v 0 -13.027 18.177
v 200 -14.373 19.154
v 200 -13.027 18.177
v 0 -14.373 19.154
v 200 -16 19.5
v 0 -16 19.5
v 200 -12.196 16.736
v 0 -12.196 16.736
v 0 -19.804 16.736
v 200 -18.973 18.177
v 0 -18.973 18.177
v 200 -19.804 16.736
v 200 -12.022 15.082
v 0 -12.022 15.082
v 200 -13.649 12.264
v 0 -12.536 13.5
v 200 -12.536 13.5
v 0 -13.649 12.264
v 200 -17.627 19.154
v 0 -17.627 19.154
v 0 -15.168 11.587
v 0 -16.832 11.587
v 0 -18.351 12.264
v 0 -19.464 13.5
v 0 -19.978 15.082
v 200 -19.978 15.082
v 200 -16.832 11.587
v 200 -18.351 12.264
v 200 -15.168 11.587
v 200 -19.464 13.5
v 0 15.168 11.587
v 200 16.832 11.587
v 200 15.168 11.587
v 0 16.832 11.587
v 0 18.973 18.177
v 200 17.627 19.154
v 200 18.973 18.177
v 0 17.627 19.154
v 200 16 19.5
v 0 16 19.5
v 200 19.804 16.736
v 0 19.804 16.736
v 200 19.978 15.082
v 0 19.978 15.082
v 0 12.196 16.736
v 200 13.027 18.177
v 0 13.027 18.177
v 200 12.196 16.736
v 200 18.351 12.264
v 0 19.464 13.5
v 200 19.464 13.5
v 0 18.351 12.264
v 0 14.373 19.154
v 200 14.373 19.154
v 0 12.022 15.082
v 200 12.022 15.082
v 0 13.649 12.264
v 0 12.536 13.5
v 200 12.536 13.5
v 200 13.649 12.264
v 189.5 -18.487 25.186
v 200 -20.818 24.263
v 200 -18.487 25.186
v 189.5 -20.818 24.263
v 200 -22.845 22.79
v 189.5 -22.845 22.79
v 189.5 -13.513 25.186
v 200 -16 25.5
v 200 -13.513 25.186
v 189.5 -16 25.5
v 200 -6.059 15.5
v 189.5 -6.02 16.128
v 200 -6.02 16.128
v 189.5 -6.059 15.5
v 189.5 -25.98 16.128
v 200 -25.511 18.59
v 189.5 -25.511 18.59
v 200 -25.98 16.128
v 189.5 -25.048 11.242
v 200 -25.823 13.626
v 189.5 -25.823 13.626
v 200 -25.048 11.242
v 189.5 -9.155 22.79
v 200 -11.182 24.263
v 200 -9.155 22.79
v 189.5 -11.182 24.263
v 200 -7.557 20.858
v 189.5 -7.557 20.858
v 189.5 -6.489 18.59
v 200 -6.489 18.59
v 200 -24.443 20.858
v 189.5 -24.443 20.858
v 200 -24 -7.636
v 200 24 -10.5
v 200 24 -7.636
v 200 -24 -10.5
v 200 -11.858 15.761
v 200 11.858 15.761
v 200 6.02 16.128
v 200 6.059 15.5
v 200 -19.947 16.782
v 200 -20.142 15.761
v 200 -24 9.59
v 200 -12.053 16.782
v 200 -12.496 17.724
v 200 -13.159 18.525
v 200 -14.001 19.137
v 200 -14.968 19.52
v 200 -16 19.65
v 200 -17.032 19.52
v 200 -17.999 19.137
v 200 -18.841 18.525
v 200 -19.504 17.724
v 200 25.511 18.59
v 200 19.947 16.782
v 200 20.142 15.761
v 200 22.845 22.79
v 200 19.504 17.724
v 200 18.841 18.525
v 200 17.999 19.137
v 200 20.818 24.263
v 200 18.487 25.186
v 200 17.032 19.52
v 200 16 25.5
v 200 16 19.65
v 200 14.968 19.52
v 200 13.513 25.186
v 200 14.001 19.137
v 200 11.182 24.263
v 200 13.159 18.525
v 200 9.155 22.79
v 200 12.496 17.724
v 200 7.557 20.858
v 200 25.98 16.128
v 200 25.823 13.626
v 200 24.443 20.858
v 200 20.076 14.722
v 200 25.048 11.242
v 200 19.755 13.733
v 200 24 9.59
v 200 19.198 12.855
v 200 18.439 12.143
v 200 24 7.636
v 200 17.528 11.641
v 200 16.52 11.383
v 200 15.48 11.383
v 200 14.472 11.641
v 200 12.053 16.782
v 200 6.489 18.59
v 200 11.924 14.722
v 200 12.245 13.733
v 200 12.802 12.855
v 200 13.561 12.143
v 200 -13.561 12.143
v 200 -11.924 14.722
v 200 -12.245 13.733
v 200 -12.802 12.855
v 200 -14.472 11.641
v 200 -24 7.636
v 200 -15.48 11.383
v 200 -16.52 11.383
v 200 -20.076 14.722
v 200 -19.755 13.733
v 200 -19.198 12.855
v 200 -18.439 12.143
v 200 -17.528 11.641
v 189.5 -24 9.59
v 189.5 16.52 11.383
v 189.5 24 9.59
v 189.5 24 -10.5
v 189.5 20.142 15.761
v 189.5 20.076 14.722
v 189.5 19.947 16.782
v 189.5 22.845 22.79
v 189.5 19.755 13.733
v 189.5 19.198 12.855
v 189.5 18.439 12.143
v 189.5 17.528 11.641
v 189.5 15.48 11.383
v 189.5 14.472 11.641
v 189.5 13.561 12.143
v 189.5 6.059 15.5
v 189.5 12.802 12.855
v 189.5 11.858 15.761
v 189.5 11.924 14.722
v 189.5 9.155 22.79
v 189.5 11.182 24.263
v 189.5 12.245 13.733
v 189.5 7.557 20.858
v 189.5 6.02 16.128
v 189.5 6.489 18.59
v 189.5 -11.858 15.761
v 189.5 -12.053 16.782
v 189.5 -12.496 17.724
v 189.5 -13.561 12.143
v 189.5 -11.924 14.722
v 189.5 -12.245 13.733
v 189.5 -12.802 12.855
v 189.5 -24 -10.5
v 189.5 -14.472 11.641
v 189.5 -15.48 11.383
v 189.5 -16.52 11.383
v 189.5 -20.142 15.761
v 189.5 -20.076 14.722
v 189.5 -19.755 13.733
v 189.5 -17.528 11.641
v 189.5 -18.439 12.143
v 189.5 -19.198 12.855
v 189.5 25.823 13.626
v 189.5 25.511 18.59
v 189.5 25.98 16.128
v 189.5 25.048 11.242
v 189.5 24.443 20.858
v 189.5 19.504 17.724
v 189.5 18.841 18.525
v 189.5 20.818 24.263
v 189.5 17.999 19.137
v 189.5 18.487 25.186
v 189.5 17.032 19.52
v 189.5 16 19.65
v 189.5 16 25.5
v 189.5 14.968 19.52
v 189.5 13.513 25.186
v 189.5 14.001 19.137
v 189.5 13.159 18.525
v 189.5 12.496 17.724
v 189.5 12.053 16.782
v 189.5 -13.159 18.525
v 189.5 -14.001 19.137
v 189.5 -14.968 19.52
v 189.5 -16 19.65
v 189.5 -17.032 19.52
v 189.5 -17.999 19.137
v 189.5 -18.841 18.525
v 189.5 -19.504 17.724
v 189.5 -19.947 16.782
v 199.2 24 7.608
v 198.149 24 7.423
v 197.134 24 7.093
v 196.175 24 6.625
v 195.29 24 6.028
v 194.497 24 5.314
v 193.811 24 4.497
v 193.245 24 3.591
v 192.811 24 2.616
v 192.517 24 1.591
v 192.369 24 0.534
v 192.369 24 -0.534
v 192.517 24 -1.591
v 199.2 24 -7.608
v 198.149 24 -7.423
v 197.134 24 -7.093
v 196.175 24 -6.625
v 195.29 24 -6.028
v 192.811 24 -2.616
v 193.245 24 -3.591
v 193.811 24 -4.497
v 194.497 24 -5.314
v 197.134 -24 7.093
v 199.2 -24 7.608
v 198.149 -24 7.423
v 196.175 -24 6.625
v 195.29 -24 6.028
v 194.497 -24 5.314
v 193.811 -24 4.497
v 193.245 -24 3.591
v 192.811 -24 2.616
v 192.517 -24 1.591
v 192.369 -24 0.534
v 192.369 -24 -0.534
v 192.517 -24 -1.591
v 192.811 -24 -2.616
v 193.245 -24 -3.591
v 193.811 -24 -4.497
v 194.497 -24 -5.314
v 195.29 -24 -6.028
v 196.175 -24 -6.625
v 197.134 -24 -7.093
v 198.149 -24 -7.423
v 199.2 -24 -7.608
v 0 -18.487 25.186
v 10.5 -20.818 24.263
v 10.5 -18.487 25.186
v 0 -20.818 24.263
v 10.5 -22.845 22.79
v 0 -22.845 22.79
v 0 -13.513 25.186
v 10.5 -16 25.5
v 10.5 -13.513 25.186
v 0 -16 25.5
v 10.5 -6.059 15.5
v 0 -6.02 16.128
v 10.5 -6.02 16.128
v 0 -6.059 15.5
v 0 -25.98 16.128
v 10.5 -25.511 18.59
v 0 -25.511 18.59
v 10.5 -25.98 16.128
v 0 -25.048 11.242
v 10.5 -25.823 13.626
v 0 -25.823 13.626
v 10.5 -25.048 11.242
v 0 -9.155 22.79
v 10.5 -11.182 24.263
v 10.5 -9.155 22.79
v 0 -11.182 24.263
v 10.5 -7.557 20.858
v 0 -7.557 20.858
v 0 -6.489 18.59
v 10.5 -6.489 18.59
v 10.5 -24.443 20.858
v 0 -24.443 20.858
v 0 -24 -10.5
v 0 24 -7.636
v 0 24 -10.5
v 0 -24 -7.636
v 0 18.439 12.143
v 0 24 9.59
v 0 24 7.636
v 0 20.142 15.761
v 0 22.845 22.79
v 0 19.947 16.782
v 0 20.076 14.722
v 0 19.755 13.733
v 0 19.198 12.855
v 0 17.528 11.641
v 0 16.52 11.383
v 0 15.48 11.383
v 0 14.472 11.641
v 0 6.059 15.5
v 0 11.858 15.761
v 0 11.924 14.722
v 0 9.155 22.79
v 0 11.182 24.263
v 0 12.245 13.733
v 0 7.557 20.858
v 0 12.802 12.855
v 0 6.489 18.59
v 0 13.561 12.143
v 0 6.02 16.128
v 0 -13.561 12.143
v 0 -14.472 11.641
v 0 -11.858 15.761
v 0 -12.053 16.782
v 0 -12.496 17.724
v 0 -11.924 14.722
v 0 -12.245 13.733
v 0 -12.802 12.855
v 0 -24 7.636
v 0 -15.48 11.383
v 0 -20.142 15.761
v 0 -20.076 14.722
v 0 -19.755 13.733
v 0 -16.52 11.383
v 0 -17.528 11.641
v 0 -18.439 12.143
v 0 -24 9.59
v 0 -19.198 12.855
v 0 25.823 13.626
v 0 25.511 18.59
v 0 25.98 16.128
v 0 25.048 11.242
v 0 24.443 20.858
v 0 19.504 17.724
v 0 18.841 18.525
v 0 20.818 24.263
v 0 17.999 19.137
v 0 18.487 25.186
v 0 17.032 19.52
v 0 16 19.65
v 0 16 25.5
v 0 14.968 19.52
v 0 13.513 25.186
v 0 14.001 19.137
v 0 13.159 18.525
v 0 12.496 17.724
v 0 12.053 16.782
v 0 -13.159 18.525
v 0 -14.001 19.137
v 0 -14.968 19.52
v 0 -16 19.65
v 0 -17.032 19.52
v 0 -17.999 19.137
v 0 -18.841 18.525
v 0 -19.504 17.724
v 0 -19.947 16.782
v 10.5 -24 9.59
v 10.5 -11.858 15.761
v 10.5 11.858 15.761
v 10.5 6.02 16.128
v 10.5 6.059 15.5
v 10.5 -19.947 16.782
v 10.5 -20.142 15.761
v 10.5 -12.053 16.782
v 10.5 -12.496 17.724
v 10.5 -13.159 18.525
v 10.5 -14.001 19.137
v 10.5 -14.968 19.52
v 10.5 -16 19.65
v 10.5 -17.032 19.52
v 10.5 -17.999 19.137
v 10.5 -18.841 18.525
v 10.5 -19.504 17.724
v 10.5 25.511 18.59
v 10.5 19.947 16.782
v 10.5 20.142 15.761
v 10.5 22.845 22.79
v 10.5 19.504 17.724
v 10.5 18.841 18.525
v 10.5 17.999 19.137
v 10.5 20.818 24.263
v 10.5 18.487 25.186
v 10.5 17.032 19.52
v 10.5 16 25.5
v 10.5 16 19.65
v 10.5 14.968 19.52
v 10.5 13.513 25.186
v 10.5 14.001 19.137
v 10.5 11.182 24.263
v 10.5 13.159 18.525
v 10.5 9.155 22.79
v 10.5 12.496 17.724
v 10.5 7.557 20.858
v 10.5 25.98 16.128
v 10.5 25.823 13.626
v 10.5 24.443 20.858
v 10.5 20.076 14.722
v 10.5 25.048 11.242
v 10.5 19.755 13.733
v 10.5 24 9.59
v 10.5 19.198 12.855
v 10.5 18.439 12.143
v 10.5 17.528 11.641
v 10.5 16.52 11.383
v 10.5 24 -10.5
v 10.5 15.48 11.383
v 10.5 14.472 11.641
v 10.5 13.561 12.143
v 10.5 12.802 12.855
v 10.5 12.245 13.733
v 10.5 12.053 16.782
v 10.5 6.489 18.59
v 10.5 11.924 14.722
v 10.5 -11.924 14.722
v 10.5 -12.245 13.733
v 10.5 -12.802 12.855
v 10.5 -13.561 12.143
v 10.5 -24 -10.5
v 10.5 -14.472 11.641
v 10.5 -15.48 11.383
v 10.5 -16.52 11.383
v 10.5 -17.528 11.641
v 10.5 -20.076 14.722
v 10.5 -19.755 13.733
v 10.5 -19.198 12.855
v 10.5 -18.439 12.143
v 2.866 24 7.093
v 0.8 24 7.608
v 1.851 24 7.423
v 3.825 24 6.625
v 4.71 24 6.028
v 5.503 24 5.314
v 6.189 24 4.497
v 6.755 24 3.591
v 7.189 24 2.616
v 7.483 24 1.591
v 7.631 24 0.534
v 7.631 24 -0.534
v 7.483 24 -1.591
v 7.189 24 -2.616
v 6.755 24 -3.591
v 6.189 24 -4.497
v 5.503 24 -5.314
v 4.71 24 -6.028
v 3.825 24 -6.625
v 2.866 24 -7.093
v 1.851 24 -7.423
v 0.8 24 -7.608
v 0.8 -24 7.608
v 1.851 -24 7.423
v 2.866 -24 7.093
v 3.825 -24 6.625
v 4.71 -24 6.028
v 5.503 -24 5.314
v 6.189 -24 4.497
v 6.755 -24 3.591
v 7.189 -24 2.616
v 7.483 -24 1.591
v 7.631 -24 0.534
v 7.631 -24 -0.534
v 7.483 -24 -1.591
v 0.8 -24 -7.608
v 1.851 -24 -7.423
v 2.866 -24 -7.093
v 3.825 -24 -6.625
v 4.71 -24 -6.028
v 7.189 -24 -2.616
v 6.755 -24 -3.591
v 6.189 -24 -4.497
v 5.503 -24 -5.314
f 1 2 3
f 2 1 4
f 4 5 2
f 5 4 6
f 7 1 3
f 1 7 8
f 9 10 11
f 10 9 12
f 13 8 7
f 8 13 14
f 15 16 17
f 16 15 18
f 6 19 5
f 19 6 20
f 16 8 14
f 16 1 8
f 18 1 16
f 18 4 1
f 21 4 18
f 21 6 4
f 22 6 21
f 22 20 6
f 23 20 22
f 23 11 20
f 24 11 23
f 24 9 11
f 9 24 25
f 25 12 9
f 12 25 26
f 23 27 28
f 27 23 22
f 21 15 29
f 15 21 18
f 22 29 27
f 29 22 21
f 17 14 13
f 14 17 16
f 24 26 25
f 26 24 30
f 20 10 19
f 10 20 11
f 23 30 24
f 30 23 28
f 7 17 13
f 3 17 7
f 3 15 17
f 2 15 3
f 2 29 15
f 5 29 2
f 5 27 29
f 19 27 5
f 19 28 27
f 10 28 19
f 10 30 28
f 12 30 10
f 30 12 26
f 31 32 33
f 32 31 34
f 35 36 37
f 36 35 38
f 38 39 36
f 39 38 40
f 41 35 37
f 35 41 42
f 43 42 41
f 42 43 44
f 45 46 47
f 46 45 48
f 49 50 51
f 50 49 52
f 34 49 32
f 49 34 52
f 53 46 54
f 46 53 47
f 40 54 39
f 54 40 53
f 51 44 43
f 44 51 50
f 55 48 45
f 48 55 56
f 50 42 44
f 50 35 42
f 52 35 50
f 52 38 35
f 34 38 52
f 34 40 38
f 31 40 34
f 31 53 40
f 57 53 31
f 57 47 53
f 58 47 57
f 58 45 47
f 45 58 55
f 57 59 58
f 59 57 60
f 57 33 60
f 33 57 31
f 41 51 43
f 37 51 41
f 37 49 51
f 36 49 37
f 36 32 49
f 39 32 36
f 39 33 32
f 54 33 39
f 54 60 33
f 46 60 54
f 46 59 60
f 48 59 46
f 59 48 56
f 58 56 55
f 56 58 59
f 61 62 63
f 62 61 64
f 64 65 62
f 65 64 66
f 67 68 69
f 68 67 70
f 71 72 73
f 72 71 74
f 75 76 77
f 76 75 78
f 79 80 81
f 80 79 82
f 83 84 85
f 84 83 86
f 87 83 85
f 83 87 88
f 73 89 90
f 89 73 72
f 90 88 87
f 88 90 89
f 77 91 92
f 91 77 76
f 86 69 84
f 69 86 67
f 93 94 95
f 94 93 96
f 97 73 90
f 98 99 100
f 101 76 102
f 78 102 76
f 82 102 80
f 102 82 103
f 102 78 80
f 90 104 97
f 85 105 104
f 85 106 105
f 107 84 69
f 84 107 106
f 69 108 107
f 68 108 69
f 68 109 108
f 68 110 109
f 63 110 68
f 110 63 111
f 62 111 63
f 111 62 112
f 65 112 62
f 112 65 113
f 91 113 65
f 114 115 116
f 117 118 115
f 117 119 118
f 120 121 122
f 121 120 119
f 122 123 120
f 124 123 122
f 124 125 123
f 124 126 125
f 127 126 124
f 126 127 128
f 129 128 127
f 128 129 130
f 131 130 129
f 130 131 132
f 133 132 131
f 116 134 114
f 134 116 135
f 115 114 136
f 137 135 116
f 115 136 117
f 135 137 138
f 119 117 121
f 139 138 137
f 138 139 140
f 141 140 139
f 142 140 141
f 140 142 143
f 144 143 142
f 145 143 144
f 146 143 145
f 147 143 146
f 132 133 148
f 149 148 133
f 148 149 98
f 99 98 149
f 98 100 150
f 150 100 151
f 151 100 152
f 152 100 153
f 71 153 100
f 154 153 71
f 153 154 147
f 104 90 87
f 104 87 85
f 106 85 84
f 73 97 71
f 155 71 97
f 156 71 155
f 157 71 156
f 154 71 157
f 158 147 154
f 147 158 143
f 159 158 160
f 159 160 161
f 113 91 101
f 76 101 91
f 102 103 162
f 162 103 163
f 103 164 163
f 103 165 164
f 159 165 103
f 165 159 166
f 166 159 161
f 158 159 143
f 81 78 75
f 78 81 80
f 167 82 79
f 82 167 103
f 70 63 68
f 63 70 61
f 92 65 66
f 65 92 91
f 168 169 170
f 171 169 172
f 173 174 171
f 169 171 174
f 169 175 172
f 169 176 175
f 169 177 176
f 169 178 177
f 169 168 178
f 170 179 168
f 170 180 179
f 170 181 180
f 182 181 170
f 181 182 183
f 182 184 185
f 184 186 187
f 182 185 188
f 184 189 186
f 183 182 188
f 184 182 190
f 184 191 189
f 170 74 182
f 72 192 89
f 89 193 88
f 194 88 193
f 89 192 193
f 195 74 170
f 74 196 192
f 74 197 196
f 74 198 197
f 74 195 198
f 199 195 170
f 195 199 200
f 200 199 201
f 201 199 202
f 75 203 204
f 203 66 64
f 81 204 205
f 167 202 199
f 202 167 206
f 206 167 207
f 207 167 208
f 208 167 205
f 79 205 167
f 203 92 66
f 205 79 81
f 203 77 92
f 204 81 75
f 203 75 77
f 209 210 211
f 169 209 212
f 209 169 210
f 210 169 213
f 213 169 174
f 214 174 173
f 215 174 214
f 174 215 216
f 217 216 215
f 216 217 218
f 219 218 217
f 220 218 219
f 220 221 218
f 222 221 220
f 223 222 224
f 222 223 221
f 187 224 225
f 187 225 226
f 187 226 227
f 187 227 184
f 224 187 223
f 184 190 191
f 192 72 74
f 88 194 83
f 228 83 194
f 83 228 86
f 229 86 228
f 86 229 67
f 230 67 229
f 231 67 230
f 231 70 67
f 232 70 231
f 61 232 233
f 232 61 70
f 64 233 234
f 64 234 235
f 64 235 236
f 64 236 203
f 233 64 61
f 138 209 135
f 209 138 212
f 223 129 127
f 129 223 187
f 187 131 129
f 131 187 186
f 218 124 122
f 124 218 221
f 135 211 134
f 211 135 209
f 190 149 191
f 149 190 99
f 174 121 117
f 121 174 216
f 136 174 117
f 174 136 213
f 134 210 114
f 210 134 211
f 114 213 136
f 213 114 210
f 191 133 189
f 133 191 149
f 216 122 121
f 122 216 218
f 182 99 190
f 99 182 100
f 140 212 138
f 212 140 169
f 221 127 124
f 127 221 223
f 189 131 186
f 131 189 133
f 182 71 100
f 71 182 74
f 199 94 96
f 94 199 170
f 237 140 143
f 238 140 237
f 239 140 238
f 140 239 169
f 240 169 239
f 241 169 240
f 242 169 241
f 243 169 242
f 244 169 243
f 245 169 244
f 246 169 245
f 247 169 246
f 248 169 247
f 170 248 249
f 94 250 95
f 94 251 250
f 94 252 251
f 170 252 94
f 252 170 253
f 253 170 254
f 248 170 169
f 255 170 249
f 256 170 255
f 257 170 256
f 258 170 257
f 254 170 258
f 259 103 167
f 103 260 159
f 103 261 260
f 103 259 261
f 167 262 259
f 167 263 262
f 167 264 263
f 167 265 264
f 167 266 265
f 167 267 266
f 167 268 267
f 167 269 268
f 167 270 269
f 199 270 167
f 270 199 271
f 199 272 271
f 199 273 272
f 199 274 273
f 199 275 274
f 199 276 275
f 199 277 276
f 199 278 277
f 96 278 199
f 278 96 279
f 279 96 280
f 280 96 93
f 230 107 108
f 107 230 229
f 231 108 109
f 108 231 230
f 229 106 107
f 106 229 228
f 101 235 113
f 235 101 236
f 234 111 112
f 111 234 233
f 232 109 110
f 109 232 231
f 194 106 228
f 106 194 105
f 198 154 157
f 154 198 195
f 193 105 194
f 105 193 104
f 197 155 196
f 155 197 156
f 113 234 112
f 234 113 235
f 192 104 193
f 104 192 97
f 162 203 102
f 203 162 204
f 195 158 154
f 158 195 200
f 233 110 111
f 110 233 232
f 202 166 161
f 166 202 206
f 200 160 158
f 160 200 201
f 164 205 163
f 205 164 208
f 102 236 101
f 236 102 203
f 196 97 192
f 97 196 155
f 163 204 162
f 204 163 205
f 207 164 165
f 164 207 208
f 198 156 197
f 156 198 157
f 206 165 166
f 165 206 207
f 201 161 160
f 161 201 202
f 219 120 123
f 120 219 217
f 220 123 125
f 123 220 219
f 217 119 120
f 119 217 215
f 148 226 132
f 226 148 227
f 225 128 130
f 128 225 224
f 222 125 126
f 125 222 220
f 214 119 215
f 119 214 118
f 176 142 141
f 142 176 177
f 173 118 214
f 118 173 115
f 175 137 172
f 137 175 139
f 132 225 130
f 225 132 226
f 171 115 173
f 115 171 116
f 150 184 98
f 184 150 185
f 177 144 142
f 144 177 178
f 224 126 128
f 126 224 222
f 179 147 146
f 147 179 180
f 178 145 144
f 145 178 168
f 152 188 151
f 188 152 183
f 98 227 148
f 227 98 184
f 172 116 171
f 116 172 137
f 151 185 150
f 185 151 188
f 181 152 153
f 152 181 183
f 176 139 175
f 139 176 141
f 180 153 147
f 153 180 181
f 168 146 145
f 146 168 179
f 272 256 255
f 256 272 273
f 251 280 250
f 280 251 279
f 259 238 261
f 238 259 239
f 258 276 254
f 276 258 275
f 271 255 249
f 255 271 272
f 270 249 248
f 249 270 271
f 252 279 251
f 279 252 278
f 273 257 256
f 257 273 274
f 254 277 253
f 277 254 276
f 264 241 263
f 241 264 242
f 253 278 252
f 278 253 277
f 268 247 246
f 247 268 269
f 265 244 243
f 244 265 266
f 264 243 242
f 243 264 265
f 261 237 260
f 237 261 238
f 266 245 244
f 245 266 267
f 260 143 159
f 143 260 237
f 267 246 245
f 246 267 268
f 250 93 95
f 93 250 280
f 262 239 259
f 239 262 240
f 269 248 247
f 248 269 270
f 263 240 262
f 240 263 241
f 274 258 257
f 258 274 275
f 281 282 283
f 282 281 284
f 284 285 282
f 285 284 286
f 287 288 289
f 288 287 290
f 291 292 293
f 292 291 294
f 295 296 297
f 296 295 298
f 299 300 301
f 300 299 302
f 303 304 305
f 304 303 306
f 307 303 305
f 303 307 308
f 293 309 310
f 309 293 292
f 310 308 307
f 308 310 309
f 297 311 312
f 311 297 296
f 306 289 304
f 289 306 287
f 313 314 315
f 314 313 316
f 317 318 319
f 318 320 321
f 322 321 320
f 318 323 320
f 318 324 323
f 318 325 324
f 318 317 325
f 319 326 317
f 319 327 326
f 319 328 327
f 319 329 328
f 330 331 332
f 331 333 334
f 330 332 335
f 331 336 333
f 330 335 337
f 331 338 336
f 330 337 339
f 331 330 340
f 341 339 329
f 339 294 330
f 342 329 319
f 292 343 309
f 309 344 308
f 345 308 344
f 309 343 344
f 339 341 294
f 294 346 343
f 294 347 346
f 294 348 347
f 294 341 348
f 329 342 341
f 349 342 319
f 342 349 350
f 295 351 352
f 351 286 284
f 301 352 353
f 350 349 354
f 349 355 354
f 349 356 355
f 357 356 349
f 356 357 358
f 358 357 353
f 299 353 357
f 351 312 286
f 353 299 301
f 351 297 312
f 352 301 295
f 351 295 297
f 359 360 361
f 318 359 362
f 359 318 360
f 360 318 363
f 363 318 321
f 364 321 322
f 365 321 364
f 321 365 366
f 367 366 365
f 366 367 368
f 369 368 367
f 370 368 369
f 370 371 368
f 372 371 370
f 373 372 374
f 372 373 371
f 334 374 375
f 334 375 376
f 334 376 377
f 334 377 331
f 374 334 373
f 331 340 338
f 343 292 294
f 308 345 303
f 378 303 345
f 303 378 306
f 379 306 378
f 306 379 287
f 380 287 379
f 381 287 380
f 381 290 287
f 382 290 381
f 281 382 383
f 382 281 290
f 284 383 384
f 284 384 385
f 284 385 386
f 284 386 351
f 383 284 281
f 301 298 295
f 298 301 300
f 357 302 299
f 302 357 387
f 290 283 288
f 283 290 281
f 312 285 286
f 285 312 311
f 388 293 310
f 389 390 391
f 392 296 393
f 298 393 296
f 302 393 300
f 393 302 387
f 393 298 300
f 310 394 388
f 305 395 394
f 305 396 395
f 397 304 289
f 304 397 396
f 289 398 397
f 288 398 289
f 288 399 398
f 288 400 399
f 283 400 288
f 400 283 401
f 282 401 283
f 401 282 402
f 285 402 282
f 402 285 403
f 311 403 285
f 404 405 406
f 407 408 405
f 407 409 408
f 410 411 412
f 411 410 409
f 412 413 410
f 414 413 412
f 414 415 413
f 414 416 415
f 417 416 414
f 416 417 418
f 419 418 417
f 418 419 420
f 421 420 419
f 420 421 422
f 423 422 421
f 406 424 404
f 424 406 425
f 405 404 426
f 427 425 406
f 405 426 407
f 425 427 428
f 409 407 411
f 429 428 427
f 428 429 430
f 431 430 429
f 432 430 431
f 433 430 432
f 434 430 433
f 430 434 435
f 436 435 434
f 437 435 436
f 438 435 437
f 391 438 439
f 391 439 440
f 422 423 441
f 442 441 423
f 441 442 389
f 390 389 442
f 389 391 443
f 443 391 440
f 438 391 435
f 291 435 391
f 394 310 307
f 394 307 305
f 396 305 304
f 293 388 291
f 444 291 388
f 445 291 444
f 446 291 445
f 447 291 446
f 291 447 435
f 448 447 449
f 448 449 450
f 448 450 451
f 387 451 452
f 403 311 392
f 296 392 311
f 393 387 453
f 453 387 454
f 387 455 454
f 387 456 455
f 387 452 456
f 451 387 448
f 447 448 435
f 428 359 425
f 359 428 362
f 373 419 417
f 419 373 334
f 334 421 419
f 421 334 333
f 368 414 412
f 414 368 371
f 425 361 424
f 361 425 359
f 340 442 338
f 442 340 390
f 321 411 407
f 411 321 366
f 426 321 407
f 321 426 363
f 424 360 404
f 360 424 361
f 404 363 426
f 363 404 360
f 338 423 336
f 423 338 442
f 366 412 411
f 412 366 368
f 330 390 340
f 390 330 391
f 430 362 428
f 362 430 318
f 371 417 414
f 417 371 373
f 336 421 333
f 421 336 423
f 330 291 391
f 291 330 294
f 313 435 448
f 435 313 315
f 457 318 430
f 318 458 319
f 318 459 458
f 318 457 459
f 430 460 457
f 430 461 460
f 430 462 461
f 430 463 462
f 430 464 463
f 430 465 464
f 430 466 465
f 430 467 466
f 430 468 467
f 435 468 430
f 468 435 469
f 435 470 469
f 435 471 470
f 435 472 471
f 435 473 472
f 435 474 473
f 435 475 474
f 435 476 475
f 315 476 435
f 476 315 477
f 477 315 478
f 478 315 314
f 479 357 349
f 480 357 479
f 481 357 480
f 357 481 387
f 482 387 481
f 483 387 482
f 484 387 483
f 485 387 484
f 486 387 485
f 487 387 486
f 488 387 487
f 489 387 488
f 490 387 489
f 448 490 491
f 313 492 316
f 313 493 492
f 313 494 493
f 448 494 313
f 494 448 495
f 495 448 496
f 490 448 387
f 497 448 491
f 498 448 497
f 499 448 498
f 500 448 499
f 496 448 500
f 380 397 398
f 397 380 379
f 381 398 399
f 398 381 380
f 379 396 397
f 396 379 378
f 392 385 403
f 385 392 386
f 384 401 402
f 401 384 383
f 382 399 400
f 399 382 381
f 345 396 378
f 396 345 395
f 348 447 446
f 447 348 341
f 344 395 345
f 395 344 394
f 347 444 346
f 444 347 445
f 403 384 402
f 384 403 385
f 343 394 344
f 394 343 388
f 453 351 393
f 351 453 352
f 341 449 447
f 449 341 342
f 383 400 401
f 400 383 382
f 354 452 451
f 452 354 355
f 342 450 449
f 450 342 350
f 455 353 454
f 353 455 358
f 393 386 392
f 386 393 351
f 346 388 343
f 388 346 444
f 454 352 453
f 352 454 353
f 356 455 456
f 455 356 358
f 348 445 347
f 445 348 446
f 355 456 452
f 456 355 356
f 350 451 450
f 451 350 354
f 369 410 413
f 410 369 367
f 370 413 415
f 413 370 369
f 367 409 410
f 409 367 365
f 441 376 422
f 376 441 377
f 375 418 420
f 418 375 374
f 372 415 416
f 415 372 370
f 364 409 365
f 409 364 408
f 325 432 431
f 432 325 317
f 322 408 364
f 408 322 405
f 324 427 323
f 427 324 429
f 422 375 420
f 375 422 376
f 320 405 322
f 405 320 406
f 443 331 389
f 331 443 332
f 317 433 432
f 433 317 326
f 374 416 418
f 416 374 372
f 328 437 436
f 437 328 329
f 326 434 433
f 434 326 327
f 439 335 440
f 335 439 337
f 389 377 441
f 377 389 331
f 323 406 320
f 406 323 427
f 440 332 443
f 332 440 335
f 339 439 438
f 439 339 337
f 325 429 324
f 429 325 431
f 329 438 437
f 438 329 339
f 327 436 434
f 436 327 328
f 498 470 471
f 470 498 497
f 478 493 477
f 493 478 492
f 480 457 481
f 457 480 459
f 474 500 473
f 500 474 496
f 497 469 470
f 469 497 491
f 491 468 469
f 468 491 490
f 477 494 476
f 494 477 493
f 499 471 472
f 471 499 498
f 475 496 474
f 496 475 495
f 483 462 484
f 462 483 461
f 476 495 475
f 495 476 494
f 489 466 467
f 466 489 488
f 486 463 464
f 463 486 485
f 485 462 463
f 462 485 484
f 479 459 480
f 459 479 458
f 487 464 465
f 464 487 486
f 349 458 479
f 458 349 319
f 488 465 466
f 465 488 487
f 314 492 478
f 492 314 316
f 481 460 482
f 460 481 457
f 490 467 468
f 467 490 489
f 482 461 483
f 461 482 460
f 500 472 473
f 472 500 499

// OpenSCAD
// file: ../Wheels.scad
//Size based on the anycubic GT2 idler
module idler() {
    difference() {
        union() {
            cylinder(d = 12.2, h = 8.57);
            cylinder(d = 17.89, h = 1);

            translate([0, 0, 7.57])
                cylinder(d = 17.89, h = 1);
        }

        translate([0, 0, -5])
            cylinder(d = 4.95, h = 20, $fn = 13);
    }
}

idler();
// file: ../Color.scad
module brass() {
    color([181 / 255, 166 / 255, 66 / 255])
        children();
}

module limey() {
    color([77 / 255, 255 / 255, 21 / 255, 1])
        children();
}
// file: ../Bearings.scad
//24mm long x 15mm outer diameter x 8mm inner diameter
//2 grooves with 14.5mm outer diameter
//Grooves vary in width between 1mm and 1.25mm

function LM8UU_Length() = 24;
function LM8UU_Diameter() = 15;

module LM8UU() {
    difference() {
        cylinder(d = LM8UU_Diameter(), LM8UU_Length(), $fn = 75);
        union() {
            translate([0, 0, -12]) cylinder(d = 8, 48, $fn = 35);
            difference() {
                translate([0, 0, 3.25]) cylinder(d = 20, 17.5);
                union() {
                    cylinder(d = 14, 24, $fn = 45);
                    translate([0, 0, (17.5 - 15.1) / 2 + 3.25]) cylinder(d = 48, 15.1);
                }
            }
        }
    }
}
LM8UU();
// file: ../../config.scad
//Bearings
function LM8UU_Pressure_Fit_Extra_Diameter() = 0.3;

//Smooth rods
function Rod_Pressure_Fit_Extra_Diameter() = 0.3;

//X Axis
function X_Axis_Rod_Separation() = 32;                          // Distance between rods
function X_Axis_Carriage_Rod_Vertical_Space() = 4;              // Distance between rods and the bearings they rest on
function X_Axis_Carriage_Mid_Bearing_Surround() = 3;            // Amount of plastic around the bearing (in the mid part of the carriage)
function X_Axis_Carriage_Rod_Surround_Extra_Diameter() = 12;    //Amount of plastic around the rods attaching them to the carriage

//Y Axis
// main file
use <../../config.scad>;

use <../Bearings.scad>;
use <../Color.scad>;
use <../Wheels.scad>;

module x_axis() {

    rod_z = LM8UU_Diameter() / 2 + 4 + X_Axis_Carriage_Rod_Vertical_Space();

    //Rods
    translate([200, 0, rod_z]) rotate([0, -90, 0]) {
        translate([0, -X_Axis_Rod_Separation() / 2, 0]) cylinder(d = 8, 200, $fn = 15);
        translate([0, X_Axis_Rod_Separation() / 2, 0]) cylinder(d = 8, 200, $fn = 15);
    }

    //Bearings
    /* translate([0, -LM8UU_Length() - 0.25, 0]) {
        translate([200, 0, 0]) rotate([-90, 0, 0]) LM8UU();
        translate([0, 0, 0]) rotate([-90, 0, 0]) LM8UU();
    }
    translate([0, 0.25, 0]) {
        translate([200, 0, 0]) rotate([-90, 0, 0]) LM8UU();
        translate([0, 0, 0]) rotate([-90, 0, 0]) LM8UU();
    } */

    //Carriage parts (3 stacked parts: inner, mid and outer)
    module carriage_mid() {

        thickness = X_Axis_Carriage_Mid_Bearing_Surround();
        x = LM8UU_Diameter() / 2 + thickness;
        y = max(X_Axis_Rod_Separation(), LM8UU_Length() * 2);
        z = LM8UU_Diameter() + X_Axis_Carriage_Rod_Vertical_Space() + thickness + 8 / 2;

        limey() difference() {
            union() {
                //Main body
                translate([-x, -y / 2, -LM8UU_Diameter() / 2 - thickness]) cube([x, y, z]);

                //Rod containers
                translate([0, 0, LM8UU_Diameter() / 2 + 4 + X_Axis_Carriage_Rod_Vertical_Space()]) {
                    translate([0, -X_Axis_Rod_Separation() / 2, 0]) rotate([0, -90, 0])
                        cylinder(d = 8 + X_Axis_Carriage_Rod_Surround_Extra_Diameter(), h = x, $fn = 25);
                    translate([0, X_Axis_Rod_Separation() / 2, 0]) rotate([0, -90, 0])
                        cylinder(d = 8 + X_Axis_Carriage_Rod_Surround_Extra_Diameter(), h = x, $fn = 25);
                }
            }
            union() {
                //Bearing hole
                translate([0, -LM8UU_Length() * 2, 0]) rotate([-90, 0, 0])
                    cylinder(d = LM8UU_Diameter() + LM8UU_Pressure_Fit_Extra_Diameter(), h = LM8UU_Length() * 4, $fn = 45);

                //Rod holes
                translate([x, 0, rod_z]) rotate([0, -90, 0])
                {
                    translate([0, -X_Axis_Rod_Separation() / 2, 0]) cylinder(d = 8 + Rod_Pressure_Fit_Extra_Diameter(), h = x * 3, $fn = 25);
                    translate([0, X_Axis_Rod_Separation() / 2, 0]) cylinder(d = 8 + Rod_Pressure_Fit_Extra_Diameter(), h = x * 3, $fn = 25);
                }

                //Screw holes for bearing clamp
                //todo: translate([-20, 6, 11]) rotate([0, 90, 0]) cylinder(d = 3, h = 40, $fn = 8);
            }
        }
    }

    module carriage_outer() {

        //Angled cutouts
        module cutout_block() {
            translate([0, 12, 19]) rotate([0, 35, 0])
                cube([30, 25, 30]);
        }

        limey() difference() {
            union() {
                //Main body
                translate([0, 1, -15 - Y_Axis_Carriage_Extra_Height() / 2])
                    cube([11, 47, X_Axis_Rod_Separation() + Y_Axis_Carriage_Extra_Height()]);
            }

            union() {
                //Bearing hole
                translate([0, -5, 0]) rotate([-90, 0, 0])
                    cylinder(d = 15.5, h = 60, $fn = 45);

                //Screw holes for bearing clamp
                translate([-20, 6, 11]) rotate([0, 90, 0]) cylinder(d = 3, h = 40, $fn = 8);
                translate([-20, 6, -11]) rotate([0, 90, 0]) cylinder(d = 3, h = 40, $fn = 8);
                translate([-20, 43, 11]) rotate([0, 90, 0]) cylinder(d = 3, h = 40, $fn = 8);
                translate([-20, 43, -11]) rotate([0, 90, 0]) cylinder(d = 3, h = 40, $fn = 8);

                //Cutout some excess material
                translate([0, 0, -1]) {
                    cutout_block();
                    mirror([0, 0, 1]) cutout_block();
                }
            }
        }
    }

    module carriage_inner() {
        //idlers
        translate([-22, 30, 0]) {
            translate([0, 0, -4.25]) {
                translate([0, 0, 4.5]) idler();
                translate([0, 0, -4.5]) idler();
            }
        }
    }

    translate([200, 0, 0]) {
        carriage_mid();
        //carriage_outer();
        //carriage_inner();
    }

    translate([0, 0, 0]) mirror([]) {
        carriage_mid();
        //carriage_outer();
        //carriage_inner();
    }
}

x_axis();
